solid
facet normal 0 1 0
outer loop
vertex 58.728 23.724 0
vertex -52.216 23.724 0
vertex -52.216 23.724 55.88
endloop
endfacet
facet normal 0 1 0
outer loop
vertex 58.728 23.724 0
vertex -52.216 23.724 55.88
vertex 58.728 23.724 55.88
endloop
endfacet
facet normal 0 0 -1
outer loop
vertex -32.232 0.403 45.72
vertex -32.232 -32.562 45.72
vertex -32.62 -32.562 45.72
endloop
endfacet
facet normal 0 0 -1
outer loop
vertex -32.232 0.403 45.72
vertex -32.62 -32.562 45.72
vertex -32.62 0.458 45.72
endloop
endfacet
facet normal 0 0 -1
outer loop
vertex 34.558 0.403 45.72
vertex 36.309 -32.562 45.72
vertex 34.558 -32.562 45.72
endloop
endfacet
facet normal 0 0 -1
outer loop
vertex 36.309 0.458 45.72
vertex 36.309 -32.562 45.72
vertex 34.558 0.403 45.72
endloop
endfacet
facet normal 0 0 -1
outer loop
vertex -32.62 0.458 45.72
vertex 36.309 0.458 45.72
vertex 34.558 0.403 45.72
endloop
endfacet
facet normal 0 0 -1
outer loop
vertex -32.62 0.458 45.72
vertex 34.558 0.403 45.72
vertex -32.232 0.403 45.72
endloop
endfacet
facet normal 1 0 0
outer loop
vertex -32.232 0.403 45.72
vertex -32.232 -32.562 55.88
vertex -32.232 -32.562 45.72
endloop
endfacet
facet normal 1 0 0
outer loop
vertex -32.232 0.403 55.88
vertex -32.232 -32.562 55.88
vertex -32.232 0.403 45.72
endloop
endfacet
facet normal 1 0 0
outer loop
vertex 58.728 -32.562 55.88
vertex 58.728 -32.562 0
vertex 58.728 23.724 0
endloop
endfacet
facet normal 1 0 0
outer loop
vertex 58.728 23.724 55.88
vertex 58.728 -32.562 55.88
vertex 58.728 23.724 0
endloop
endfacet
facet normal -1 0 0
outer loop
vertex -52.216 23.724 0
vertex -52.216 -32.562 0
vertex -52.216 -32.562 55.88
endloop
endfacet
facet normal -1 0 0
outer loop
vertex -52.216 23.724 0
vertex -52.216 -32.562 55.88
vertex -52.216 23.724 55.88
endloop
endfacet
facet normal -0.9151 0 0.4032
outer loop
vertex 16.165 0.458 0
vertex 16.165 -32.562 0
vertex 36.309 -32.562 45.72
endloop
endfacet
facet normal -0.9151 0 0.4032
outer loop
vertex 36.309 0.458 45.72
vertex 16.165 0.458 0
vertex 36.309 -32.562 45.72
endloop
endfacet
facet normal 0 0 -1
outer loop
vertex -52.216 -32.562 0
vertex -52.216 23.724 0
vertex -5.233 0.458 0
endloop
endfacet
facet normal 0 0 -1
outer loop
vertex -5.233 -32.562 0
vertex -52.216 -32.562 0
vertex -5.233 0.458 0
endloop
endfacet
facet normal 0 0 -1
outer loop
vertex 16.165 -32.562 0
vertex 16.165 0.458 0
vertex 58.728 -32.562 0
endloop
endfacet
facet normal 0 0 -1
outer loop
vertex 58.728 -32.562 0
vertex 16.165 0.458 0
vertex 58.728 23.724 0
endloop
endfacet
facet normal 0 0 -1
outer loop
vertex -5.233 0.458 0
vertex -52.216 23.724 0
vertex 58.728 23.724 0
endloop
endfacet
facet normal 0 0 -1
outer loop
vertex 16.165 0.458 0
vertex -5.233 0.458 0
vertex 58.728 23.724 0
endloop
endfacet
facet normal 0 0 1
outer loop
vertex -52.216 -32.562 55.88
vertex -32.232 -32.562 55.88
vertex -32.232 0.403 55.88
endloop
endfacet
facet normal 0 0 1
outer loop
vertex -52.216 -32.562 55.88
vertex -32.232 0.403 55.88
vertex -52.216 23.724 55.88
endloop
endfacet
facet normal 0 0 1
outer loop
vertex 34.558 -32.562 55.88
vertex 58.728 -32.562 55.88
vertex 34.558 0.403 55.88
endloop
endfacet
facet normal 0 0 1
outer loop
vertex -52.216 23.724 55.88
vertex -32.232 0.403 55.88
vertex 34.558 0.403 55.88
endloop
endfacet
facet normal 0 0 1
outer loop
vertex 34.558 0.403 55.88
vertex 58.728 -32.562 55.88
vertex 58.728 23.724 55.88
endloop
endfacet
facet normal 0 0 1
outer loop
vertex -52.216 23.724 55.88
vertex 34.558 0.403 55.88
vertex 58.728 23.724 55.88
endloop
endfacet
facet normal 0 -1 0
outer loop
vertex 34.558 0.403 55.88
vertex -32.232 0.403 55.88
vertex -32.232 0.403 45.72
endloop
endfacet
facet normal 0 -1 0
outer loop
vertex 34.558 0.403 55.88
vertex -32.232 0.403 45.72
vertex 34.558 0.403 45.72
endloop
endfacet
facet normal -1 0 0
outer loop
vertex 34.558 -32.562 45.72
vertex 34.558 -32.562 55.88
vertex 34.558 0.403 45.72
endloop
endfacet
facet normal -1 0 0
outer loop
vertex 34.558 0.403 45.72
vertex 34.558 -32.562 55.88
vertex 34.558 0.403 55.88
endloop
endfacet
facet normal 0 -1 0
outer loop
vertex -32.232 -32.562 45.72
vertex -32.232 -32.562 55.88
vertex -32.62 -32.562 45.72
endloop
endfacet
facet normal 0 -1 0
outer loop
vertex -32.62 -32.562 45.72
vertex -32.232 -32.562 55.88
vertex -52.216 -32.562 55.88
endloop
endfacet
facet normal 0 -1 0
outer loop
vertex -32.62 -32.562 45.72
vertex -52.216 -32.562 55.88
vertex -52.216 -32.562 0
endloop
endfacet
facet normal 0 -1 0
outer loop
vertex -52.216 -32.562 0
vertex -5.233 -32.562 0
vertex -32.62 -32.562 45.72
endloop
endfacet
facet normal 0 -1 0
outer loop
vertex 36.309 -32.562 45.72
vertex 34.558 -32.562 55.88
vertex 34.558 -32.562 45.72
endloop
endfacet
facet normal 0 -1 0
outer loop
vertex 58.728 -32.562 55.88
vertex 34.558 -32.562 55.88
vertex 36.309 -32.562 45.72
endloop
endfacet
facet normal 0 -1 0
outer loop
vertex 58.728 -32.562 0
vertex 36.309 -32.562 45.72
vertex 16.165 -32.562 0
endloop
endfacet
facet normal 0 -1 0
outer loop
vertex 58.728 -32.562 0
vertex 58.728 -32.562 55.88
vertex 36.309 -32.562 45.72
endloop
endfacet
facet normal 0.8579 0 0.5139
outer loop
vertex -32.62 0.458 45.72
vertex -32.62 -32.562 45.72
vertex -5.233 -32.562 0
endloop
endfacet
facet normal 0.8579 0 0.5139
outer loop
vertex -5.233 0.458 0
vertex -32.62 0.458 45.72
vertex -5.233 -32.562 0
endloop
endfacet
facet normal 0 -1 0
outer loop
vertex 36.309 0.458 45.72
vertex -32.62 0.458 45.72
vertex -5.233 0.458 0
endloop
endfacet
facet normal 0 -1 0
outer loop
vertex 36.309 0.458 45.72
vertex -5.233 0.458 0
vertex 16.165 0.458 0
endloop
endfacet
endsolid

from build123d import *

# Parameters (mm, degrees)
F0_W     = 110.9441034496
F0_H     = 56.2861021608
F1_DEPTH = 55.88
F3_DEPTH = 33.02
F4_W     = 71.8694478273
F4_H     = 43.125666678
F5_DEPTH = 10.16
F6_DEPTH = 2.54
F7_DEPTH = 10.16
F8_DEPTH = 2.54


with BuildPart() as f1:
    # F0 (on Top) → F1 (new body)
    with BuildSketch(Plane.XY):
        with Locations((3.2562222332, -4.4191563502)):
            Rectangle(F0_W, F0_H)
    extrude(amount=F1_DEPTH)

    # F2 (on face) → F3 (cut)
    with BuildSketch(Plane.XZ.offset(32.5622074306)):
        Polygon((36.8650741875, 46.9826161861), (-33.3762653172, 46.9826161861), (-5.2332119085, 0), (16.1648113281, 0), align=None)
    extrude(amount=-F3_DEPTH, mode=Mode.SUBTRACT)

    # F4 (on face) → F5 (cut)
    with BuildSketch(Plane.XY.offset(55.88)):
        with Locations((1.1629350483, -10.9993740916)):
            Rectangle(F4_W, F4_H)
    extrude(amount=-F5_DEPTH, mode=Mode.SUBTRACT)

    # F6 (add): a face of the model
    f6_faces = [f1.faces().sort_by_distance(p)[0] for p in [
        (-34.7717888653, -10.9993740916, 50.8),
    ]]
    extrude(f6_faces, amount=F6_DEPTH)

    # F7 (add): a face of the model
    f7_faces = [f1.faces().sort_by_distance(p)[0] for p in [
        (2.4329350483, 10.5634592474, 50.8),
    ]]
    extrude(f7_faces, amount=F7_DEPTH)

    # F8 (add): a face of the model
    f8_faces = [f1.faces().sort_by_distance(p)[0] for p in [
        (37.097658962, -16.0793740916, 50.8),
    ]]
    extrude(f8_faces, amount=F8_DEPTH)


solid = f1.part
